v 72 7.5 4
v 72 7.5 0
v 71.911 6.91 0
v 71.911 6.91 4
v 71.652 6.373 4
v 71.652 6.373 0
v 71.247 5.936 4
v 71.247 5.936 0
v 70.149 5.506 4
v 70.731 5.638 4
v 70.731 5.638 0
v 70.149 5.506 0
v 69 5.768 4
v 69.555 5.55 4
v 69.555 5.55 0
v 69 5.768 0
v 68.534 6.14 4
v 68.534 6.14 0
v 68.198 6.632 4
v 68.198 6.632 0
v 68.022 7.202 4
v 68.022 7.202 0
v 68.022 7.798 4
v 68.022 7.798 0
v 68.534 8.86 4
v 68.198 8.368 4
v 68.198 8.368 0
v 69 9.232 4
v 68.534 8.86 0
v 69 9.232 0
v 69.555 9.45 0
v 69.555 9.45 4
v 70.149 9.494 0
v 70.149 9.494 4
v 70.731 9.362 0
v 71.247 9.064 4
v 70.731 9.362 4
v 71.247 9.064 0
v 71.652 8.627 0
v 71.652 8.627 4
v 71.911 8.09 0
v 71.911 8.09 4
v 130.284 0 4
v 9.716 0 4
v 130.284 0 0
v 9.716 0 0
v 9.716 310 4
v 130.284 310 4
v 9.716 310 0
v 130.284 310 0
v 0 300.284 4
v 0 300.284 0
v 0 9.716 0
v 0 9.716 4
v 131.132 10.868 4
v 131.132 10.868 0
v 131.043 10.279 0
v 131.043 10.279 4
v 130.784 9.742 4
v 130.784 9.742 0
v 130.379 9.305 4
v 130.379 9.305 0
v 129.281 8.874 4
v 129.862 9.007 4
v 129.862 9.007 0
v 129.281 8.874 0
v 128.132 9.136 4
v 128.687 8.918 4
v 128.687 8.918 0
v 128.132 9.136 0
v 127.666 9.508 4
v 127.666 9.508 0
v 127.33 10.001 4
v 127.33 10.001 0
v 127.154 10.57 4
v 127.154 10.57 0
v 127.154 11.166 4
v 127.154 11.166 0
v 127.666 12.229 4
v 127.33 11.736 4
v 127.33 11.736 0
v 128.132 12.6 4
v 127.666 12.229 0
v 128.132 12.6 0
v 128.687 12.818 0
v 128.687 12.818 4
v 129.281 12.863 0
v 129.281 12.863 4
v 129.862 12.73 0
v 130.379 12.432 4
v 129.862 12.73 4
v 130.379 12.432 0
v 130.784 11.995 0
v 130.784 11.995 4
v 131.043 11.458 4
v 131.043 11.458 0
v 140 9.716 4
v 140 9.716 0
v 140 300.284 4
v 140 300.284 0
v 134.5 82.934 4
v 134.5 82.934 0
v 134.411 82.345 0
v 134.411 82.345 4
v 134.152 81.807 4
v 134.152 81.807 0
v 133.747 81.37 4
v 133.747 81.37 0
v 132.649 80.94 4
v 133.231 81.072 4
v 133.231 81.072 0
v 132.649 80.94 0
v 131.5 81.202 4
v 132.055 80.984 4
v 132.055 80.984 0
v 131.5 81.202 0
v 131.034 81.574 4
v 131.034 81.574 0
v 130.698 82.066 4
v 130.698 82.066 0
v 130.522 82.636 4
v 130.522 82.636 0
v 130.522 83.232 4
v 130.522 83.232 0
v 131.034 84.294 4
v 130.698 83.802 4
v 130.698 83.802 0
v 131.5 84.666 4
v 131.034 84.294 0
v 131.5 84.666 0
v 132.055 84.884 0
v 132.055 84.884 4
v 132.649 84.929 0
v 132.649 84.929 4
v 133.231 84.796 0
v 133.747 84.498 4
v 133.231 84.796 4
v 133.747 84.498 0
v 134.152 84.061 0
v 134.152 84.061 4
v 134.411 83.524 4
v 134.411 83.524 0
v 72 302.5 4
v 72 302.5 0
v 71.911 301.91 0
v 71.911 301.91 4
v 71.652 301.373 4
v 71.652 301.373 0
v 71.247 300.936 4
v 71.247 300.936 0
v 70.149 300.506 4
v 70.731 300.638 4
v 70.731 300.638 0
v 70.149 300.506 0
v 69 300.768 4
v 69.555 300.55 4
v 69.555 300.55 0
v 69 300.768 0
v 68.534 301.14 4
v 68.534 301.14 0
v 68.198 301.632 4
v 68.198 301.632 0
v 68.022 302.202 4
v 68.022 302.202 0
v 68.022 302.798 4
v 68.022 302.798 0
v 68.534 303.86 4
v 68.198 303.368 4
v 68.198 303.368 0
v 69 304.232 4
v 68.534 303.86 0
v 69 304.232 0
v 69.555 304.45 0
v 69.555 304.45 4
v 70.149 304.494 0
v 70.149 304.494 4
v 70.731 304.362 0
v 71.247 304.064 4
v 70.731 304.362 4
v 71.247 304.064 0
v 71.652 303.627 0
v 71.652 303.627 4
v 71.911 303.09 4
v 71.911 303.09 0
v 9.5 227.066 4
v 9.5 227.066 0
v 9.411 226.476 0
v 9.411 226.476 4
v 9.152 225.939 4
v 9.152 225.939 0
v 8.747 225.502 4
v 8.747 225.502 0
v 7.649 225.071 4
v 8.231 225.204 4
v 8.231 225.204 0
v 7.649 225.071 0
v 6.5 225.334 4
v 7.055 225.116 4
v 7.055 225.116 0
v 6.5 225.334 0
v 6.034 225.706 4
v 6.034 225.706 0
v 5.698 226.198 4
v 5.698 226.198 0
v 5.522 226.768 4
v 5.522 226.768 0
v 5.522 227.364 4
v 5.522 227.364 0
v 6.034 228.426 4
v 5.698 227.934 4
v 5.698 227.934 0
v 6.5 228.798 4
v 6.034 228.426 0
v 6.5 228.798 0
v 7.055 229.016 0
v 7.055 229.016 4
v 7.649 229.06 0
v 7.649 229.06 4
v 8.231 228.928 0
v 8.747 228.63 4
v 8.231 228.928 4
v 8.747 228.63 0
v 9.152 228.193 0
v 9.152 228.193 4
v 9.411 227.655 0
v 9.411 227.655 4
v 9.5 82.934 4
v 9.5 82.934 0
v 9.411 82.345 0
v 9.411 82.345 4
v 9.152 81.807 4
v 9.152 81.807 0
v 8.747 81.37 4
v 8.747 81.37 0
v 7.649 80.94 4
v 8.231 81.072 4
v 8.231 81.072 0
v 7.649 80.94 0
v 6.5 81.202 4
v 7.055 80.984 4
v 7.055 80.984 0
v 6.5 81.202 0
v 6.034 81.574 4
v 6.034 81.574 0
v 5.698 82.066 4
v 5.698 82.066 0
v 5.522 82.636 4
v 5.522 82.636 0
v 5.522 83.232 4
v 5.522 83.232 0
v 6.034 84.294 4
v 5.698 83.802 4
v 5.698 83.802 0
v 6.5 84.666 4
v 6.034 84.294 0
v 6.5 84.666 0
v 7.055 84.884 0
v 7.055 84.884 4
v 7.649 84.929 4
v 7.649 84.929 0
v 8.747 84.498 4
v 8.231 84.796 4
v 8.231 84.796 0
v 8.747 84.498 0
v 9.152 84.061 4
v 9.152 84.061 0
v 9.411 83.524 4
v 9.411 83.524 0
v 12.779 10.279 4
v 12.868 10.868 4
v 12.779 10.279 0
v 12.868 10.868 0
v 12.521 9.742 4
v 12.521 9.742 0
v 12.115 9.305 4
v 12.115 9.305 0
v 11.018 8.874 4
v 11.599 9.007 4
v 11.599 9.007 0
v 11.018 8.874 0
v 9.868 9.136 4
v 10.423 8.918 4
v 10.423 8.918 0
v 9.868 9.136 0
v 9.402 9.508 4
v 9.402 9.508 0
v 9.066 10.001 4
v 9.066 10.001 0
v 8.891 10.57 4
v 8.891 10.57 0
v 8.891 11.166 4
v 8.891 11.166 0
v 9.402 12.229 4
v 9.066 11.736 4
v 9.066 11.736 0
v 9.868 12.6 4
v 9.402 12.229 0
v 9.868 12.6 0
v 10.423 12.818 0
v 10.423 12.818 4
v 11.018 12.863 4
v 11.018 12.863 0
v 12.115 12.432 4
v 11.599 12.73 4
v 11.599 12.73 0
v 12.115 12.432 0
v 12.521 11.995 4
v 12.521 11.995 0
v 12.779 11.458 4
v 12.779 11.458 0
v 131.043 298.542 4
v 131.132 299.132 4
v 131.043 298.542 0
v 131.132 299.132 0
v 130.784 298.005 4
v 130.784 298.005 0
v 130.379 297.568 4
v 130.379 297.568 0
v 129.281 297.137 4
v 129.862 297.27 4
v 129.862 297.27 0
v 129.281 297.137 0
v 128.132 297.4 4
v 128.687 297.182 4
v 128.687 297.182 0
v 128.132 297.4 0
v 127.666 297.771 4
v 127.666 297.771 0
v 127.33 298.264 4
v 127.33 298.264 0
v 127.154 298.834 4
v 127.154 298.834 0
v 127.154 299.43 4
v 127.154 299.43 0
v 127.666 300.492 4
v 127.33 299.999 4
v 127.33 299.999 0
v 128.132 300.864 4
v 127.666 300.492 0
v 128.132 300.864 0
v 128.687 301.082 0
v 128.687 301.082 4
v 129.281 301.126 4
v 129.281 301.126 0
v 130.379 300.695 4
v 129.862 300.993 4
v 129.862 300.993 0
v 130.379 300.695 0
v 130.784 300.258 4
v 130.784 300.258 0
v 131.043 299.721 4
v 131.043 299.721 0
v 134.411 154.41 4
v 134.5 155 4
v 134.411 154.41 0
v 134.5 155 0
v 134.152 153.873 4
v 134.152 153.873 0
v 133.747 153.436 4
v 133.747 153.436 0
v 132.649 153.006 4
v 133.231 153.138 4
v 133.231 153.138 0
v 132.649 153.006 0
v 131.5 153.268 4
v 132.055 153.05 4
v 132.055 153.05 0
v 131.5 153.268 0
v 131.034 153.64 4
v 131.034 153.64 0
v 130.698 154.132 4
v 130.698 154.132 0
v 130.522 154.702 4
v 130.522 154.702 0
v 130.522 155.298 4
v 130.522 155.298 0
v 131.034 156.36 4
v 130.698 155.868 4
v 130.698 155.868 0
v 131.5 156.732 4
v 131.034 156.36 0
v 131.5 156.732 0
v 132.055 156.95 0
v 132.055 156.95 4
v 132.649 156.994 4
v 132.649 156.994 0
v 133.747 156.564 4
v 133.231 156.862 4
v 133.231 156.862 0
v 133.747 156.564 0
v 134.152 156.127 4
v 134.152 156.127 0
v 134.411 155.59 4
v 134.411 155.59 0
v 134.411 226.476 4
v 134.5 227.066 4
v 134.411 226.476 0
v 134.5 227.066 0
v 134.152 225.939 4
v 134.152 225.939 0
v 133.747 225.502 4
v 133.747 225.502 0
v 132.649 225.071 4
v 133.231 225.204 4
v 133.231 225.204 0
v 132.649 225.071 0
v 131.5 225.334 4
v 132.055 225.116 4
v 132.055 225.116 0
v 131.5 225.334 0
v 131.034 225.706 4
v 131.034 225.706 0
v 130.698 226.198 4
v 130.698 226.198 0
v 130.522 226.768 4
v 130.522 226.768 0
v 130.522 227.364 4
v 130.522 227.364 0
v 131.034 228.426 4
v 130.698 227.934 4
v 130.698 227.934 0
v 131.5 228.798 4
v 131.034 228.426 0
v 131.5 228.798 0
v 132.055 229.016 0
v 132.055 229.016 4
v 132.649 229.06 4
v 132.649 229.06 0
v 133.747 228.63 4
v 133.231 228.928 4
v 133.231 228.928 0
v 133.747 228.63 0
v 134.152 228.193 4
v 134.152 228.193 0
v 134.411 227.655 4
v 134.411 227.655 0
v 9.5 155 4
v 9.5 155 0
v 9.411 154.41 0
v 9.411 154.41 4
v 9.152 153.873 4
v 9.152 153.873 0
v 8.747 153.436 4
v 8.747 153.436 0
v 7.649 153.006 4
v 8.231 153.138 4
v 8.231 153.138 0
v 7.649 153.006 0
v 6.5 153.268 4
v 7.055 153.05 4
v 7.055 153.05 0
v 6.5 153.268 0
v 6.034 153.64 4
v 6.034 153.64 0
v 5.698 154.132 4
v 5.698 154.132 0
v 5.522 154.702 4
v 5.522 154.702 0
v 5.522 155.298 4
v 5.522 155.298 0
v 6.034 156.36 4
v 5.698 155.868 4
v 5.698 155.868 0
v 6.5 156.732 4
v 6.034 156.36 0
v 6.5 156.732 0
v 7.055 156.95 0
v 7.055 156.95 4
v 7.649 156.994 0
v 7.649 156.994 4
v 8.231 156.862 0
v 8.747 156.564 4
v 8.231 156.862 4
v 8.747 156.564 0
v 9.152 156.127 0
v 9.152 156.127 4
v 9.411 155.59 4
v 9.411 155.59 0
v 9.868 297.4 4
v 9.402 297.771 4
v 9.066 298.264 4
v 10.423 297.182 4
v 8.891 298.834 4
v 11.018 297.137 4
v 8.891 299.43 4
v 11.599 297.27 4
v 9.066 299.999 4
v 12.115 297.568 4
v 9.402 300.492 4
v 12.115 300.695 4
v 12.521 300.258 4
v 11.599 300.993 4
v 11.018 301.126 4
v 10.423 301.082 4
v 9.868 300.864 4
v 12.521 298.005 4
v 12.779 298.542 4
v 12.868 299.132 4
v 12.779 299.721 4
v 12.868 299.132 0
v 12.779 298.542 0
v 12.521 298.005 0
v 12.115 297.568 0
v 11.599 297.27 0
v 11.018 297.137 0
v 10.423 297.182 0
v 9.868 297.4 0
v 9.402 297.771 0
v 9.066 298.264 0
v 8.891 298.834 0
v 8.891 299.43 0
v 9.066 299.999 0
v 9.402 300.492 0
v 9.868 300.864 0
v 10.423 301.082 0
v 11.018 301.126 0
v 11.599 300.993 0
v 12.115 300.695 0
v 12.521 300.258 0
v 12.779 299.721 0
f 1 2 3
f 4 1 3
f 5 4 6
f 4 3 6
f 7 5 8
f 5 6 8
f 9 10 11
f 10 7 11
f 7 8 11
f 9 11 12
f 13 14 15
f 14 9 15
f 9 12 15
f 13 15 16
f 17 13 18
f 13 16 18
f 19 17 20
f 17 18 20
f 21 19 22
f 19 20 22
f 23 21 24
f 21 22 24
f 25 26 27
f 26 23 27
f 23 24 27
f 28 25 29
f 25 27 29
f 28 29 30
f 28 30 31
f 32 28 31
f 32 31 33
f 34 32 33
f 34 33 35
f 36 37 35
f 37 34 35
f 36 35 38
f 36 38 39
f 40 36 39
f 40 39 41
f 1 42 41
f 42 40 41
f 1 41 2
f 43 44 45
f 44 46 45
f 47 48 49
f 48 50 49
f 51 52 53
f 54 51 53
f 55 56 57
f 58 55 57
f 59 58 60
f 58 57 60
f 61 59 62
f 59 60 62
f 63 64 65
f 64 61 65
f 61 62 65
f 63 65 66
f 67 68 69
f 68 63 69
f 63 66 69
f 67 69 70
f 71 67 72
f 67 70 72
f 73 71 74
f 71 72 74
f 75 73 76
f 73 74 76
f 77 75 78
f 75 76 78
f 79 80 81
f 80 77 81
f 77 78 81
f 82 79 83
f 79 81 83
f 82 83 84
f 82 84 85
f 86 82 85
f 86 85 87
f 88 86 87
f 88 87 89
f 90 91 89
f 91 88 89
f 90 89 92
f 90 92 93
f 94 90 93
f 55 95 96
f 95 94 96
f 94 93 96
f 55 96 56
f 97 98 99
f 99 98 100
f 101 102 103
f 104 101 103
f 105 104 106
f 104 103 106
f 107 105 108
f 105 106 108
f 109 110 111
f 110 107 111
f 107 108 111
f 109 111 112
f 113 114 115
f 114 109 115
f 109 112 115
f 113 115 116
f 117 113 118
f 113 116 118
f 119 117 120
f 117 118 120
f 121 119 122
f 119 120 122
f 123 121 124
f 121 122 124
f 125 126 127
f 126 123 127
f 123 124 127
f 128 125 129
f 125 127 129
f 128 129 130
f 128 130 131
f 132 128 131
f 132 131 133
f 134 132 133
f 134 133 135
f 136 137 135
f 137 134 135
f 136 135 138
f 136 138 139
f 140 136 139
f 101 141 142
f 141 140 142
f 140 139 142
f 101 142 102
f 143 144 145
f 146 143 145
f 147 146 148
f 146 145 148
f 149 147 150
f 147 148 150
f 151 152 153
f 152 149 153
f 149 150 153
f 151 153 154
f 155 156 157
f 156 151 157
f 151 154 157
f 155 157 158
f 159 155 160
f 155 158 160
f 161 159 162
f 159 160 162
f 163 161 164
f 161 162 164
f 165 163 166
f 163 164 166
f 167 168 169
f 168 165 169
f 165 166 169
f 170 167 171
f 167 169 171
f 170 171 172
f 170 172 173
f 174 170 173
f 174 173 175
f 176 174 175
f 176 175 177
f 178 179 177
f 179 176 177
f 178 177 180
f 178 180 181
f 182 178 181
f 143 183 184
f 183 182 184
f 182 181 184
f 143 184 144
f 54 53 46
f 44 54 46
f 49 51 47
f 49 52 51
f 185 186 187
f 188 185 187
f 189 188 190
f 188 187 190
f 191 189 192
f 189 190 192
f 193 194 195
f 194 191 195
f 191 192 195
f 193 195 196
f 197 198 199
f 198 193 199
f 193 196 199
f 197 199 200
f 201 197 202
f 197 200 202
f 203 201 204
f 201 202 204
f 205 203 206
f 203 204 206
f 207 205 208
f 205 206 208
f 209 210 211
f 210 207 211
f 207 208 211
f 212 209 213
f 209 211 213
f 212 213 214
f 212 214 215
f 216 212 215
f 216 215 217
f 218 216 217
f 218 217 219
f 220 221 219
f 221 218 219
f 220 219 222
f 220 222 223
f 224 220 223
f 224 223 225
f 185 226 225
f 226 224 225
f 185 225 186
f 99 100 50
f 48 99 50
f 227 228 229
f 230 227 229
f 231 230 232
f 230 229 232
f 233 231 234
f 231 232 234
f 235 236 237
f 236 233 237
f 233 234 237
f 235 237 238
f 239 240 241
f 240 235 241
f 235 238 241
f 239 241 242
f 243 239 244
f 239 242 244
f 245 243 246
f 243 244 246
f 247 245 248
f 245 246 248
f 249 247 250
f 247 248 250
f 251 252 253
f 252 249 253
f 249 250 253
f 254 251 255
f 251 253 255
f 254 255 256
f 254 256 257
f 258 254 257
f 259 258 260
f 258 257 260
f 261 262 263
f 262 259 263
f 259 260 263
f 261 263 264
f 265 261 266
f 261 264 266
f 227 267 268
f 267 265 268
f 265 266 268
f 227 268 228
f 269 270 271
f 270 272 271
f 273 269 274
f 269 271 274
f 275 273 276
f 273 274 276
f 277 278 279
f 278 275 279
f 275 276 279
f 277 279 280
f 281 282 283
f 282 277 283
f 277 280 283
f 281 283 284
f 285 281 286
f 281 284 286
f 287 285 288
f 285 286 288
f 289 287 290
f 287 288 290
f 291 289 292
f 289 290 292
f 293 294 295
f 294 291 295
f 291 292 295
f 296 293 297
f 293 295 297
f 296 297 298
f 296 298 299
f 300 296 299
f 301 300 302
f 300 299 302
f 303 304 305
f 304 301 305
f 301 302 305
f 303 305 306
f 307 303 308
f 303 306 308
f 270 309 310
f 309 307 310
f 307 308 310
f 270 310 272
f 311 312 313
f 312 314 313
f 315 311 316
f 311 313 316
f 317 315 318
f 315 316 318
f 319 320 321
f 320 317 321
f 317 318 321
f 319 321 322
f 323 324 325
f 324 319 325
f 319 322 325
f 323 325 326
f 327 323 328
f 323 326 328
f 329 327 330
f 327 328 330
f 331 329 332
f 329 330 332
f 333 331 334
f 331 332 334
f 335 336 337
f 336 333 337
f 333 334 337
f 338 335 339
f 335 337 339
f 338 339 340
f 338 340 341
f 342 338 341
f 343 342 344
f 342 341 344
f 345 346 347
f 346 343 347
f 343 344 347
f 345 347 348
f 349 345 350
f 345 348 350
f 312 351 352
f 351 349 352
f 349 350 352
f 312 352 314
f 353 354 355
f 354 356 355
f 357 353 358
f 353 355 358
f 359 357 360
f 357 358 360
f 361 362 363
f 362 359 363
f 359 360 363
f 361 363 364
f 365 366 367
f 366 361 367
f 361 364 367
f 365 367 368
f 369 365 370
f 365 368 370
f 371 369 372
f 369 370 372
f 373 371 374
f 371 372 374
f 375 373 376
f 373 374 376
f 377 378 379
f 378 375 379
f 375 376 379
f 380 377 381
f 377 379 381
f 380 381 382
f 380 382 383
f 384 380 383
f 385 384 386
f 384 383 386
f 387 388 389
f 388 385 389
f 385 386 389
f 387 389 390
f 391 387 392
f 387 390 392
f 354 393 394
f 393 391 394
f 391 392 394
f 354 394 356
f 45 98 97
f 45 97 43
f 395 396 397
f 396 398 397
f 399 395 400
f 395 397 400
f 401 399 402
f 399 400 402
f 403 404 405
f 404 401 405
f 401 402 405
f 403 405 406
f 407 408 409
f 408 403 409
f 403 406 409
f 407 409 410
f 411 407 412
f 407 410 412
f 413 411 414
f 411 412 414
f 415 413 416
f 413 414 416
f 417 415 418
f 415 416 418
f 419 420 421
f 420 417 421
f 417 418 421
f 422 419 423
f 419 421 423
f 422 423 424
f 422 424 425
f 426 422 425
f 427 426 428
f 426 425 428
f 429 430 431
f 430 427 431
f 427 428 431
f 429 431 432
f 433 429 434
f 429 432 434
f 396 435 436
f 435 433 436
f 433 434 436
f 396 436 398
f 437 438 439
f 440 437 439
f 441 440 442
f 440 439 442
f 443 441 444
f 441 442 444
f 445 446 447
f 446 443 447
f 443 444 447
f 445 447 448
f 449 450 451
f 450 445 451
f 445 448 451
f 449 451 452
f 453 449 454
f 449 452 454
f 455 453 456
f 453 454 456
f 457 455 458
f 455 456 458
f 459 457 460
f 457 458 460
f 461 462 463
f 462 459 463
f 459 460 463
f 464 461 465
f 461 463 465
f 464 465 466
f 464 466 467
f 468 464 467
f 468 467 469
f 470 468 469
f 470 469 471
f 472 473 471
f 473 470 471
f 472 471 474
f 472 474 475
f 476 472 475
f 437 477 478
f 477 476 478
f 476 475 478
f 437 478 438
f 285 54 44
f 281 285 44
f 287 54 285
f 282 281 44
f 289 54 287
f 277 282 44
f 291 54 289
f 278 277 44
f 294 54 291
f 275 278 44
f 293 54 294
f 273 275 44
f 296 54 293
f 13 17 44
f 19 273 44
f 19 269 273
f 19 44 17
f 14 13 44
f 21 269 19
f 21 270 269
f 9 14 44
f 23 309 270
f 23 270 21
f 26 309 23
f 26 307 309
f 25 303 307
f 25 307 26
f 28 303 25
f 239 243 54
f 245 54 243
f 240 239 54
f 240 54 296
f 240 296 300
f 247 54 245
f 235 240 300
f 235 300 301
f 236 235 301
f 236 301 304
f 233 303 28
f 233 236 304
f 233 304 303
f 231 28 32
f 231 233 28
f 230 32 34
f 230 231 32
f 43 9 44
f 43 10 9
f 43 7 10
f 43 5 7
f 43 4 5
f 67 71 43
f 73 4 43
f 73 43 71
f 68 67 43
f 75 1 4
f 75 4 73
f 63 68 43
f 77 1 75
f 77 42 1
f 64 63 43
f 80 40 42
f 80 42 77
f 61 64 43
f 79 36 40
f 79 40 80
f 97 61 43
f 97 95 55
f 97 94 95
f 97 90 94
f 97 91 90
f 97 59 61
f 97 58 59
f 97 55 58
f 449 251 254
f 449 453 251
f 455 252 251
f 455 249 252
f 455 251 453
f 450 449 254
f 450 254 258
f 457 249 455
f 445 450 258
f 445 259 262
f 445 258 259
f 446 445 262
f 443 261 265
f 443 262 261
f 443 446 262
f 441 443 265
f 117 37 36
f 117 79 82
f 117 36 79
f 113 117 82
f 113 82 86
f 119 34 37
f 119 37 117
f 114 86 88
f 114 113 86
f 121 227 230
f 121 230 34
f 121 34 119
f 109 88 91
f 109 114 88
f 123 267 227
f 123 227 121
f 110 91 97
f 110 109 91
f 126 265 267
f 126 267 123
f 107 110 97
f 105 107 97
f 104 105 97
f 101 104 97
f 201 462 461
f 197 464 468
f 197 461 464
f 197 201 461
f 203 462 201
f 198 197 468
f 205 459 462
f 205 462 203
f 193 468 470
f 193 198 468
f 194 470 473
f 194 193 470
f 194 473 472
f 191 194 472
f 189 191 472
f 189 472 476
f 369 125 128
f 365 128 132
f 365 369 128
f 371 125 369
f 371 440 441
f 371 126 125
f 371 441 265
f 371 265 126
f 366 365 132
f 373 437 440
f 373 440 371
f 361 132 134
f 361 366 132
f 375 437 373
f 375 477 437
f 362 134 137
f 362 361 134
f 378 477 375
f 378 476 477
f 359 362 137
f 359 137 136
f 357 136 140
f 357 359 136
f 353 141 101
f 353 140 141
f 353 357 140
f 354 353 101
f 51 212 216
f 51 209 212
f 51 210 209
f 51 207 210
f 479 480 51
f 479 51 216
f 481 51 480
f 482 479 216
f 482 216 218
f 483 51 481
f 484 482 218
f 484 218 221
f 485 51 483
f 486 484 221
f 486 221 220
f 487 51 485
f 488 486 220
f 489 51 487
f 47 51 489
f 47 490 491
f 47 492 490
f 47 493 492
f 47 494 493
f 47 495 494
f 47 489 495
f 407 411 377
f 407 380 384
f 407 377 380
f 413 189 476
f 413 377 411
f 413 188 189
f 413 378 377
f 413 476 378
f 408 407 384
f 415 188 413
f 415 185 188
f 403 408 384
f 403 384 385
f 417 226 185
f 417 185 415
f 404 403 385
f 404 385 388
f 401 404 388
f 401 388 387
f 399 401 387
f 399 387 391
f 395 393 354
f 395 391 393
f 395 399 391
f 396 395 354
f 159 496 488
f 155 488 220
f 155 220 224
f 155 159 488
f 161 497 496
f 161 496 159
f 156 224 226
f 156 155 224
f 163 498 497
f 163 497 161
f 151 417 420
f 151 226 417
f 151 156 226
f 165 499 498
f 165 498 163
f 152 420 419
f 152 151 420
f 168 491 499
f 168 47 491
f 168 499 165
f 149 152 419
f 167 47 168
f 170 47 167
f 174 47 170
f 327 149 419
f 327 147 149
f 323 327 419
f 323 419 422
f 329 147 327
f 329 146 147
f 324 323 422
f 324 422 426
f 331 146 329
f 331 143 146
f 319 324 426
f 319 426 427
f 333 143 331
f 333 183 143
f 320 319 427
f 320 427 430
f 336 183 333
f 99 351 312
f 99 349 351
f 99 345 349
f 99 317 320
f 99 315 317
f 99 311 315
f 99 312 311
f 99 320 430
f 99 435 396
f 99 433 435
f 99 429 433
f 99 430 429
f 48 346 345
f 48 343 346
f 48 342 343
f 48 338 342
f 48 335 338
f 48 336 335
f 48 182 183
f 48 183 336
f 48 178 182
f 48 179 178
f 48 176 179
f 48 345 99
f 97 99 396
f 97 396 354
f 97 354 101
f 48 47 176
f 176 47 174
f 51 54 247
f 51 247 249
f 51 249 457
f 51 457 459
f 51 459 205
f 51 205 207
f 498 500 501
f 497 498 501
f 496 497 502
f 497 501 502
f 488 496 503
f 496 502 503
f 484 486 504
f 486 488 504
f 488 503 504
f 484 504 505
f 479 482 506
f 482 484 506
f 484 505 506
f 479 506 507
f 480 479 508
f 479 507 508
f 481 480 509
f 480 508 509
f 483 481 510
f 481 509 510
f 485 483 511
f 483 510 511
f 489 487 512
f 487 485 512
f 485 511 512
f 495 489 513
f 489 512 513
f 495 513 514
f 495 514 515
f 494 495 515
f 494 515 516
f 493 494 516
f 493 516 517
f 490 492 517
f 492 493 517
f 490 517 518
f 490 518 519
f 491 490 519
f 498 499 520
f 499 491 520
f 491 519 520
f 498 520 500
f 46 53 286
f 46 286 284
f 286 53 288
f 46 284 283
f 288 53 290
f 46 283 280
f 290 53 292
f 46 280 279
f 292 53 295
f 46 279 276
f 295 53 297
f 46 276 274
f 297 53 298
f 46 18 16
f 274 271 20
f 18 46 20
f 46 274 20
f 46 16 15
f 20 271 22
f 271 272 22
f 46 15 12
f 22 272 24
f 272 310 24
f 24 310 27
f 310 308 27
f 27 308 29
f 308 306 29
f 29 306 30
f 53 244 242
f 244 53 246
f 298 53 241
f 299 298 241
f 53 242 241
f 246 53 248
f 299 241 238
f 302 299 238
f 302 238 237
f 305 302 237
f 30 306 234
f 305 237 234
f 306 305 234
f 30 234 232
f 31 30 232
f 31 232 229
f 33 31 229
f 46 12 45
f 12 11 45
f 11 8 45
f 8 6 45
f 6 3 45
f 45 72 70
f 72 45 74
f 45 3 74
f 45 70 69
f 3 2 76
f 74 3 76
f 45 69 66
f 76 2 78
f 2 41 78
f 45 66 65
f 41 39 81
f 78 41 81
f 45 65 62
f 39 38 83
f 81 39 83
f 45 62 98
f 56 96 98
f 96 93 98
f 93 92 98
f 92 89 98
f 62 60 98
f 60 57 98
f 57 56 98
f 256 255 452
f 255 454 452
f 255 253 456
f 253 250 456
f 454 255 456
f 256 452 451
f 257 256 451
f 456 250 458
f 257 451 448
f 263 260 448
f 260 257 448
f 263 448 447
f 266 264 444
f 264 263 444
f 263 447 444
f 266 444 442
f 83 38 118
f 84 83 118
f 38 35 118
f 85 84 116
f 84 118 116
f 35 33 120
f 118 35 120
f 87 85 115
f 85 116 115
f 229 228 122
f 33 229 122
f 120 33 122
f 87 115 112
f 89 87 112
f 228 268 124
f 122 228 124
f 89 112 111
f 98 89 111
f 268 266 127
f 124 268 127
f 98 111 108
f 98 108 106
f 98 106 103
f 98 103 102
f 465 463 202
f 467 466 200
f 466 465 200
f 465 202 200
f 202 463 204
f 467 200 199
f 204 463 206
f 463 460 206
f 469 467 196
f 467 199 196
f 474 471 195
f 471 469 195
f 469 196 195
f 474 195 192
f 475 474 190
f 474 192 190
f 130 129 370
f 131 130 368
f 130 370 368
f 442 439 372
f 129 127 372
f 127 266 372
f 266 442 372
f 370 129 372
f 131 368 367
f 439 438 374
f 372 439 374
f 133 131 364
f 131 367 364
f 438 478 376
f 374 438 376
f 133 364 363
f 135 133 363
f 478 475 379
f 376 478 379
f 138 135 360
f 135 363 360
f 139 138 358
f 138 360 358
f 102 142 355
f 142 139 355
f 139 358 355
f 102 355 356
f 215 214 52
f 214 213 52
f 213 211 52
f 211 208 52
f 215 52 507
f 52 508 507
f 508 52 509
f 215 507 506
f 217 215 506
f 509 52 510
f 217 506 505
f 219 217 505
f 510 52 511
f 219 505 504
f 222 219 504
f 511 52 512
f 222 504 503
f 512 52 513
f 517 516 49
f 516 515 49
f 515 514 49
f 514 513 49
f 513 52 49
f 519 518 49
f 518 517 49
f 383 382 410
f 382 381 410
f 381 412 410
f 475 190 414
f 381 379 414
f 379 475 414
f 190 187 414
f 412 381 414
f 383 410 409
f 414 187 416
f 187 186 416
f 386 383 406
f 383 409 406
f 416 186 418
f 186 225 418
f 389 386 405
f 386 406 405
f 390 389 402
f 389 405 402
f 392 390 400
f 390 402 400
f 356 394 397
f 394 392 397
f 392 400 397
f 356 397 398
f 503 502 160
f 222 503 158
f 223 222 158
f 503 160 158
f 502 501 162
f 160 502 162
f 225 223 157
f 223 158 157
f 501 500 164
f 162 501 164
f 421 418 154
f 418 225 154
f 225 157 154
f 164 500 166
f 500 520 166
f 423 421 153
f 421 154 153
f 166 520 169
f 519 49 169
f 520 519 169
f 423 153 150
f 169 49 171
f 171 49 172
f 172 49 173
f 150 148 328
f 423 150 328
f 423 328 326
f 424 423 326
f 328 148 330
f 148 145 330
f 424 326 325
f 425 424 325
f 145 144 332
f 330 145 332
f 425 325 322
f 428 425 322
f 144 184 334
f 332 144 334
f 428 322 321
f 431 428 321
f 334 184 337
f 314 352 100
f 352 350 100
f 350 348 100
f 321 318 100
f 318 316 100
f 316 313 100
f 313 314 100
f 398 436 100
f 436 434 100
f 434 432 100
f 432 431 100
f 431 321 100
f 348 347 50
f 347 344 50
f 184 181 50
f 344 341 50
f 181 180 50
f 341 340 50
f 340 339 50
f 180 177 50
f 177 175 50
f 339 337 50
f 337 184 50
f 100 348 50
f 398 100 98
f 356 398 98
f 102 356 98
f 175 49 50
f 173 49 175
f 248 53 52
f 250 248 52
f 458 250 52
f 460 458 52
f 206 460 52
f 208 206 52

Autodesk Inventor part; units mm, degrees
ref_plane "YZ Plane" through (0, 0, 0) normal (1, 0, 0) x (0, 1, 0)
ref_plane "XZ Plane" through (0, 0, 0) normal (0, 1, 0) x (-1, 0, 0)
ref_plane "XY Plane" through (0, 0, 0) normal (0, 0, 1) x (1, 0, 0)
sketch "Sketch1" plane through (0, 0, 0) normal (0, 0, 1) x (1, 0, 0)
  line L0 (0, 0) -> (140, 0)
  line L1 (140, 0) -> (140, 310)
  line L2 (140, 310) -> (0, 310)
  line L3 (0, 310) -> (0, 0)
  line L4 (15, 295) -> (125, 295) construction
  line L5 (125, 295) -> (125, 15) construction
  line L6 (125, 15) -> (15, 15) construction
  line L7 (15, 15) -> (15, 295) construction
  line L8 (15, 295) -> (125, 295) construction
  line L9 (70, 314.0975) -> (70, 322.6254) construction
  line L10 (15, 295) -> (15, 269.8596) construction
  line L11 (125, 295) -> (125, 292.6022) construction
  line L12 (0, 165.5) -> (-18, 165.5)
  line L13 (-18, 165.5) -> (-18, 185.5)
  line L14 (-18, 185.5) -> (0, 185.5) construction
  line L15 (0, 185.5) -> (0, 165.5)
  line L16 (-24.3067, 155) -> (-34.4998, 155) construction
  circle A0 centre (-9, 175.5) radius 3
  line L17 (-18, 185.5) -> (0, 205.5)
  line L18 (0, 144.5) -> (-18, 144.5)
  line L19 (-18, 144.5) -> (-18, 124.5)
  circle A1 centre (-9, 134.5) radius 3
  line L20 (-18, 124.5) -> (0, 104.5)
  line L21 (140, 165.5) -> (158, 165.5)
  line L22 (158, 165.5) -> (158, 185.5)
  circle A2 centre (149, 175.5) radius 3
  line L23 (158, 185.5) -> (140, 205.5)
  line L24 (158, 144.5) -> (158, 124.5)
  line L25 (140, 144.5) -> (158, 144.5)
  circle A3 centre (149, 134.5) radius 3
  line L26 (158, 124.5) -> (140, 104.5)
  line L27 (0, 300.2843) -> (9.7157, 310)
  line L28 (140, 300.2843) -> (130.2843, 310)
  line L29 (0, 9.7157) -> (9.7157, 0)
  line L30 (140, 9.7157) -> (130.2843, 0)
  line L31 (70, 295) -> (70, 310) construction
  line L32 (0, 155) -> (15, 155) construction
  line L33 (23.9173, 286.0827) -> (15, 295) construction
  line L34 (16.5096, 292.7523) -> (17.2477, 293.4904)
  line L35 (23.9173, 286.0827) -> (16.8787, 293.1213) construction
  line L36 (123.4904, 292.7523) -> (122.7523, 293.4904)
  line L37 (15, 17.2679) -> (15, 136.2679) construction
  line L38 (17, 136.2679) -> (17, 17.2679)
  arc A4 (17, 136.2679) -> (15, 136.2679) centre (16, 136.2679) ccw construction
  arc A5 (14, 16.2679) -> (15, 17.2679) centre (14, 17.2679) ccw construction
  line L39 (14, 16.2679) -> (12, 16.2679) construction
  arc A6 (17, 17.2679) -> (18, 16.2679) centre (18, 17.2679) ccw
  line L40 (20, 16.2679) -> (18, 16.2679)
  line L41 (21, 17.2679) -> (21, 136.2679)
  line L42 (23, 136.2679) -> (23, 17.2679)
  arc A7 (23, 17.2679) -> (24, 16.2679) centre (24, 17.2679) ccw
  arc A8 (23, 136.2679) -> (21, 136.2679) centre (22, 136.2679) ccw
  arc A9 (20, 16.2679) -> (21, 17.2679) centre (20, 17.2679) ccw
  line L43 (26, 16.2679) -> (24, 16.2679)
  line L44 (27, 17.2679) -> (27, 136.2679)
  line L45 (29, 136.2679) -> (29, 17.2679)
  arc A10 (29, 17.2679) -> (30, 16.2679) centre (30, 17.2679) ccw
  arc A11 (29, 136.2679) -> (27, 136.2679) centre (28, 136.2679) ccw
  arc A12 (26, 16.2679) -> (27, 17.2679) centre (26, 17.2679) ccw
  line L46 (32, 16.2679) -> (30, 16.2679)
  line L47 (33, 17.2679) -> (33, 136.2679)
  line L48 (35, 136.2679) -> (35, 17.2679)
  arc A13 (35, 17.2679) -> (36, 16.2679) centre (36, 17.2679) ccw
  arc A14 (35, 136.2679) -> (33, 136.2679) centre (34, 136.2679) ccw
  arc A15 (32, 16.2679) -> (33, 17.2679) centre (32, 17.2679) ccw
  line L49 (38, 16.2679) -> (36, 16.2679)
  line L50 (39, 17.2679) -> (39, 136.2679)
  line L51 (41, 136.2679) -> (41, 17.2679)
  arc A16 (41, 17.2679) -> (42, 16.2679) centre (42, 17.2679) ccw
  arc A17 (41, 136.2679) -> (39, 136.2679) centre (40, 136.2679) ccw
  arc A18 (38, 16.2679) -> (39, 17.2679) centre (38, 17.2679) ccw
  line L52 (44, 16.2679) -> (42, 16.2679)
  line L53 (45, 17.2679) -> (45, 136.2679)
  line L54 (47, 136.2679) -> (47, 17.2679)
  arc A19 (47, 17.2679) -> (48, 16.2679) centre (48, 17.2679) ccw
  arc A20 (47, 136.2679) -> (45, 136.2679) centre (46, 136.2679) ccw
  arc A21 (44, 16.2679) -> (45, 17.2679) centre (44, 17.2679) ccw
  line L55 (50, 16.2679) -> (48, 16.2679)
  line L56 (51, 17.2679) -> (51, 136.2679)
  line L57 (53, 136.2679) -> (53, 17.2679)
  arc A22 (53, 17.2679) -> (54, 16.2679) centre (54, 17.2679) ccw
  arc A23 (53, 136.2679) -> (51, 136.2679) centre (52, 136.2679) ccw
  arc A24 (50, 16.2679) -> (51, 17.2679) centre (50, 17.2679) ccw
  line L58 (56, 16.2679) -> (54, 16.2679)
  line L59 (57, 17.2679) -> (57, 136.2679)
  line L60 (59, 136.2679) -> (59, 17.2679)
  arc A25 (59, 17.2679) -> (60, 16.2679) centre (60, 17.2679) ccw
  arc A26 (59, 136.2679) -> (57, 136.2679) centre (58, 136.2679) ccw
  arc A27 (56, 16.2679) -> (57, 17.2679) centre (56, 17.2679) ccw
  line L61 (62, 16.2679) -> (60, 16.2679)
  line L62 (63, 17.2679) -> (63, 136.2679)
  line L63 (65, 136.2679) -> (65, 17.2679)
  arc A28 (65, 17.2679) -> (66, 16.2679) centre (66, 17.2679) ccw
  arc A29 (65, 136.2679) -> (63, 136.2679) centre (64, 136.2679) ccw
  arc A30 (62, 16.2679) -> (63, 17.2679) centre (62, 17.2679) ccw
  line L64 (68, 16.2679) -> (66, 16.2679)
  line L65 (69, 17.2679) -> (69, 136.2679)
  line L66 (71, 136.2679) -> (71, 17.2679)
  arc A31 (71, 17.2679) -> (72, 16.2679) centre (72, 17.2679) ccw
  arc A32 (71, 136.2679) -> (69, 136.2679) centre (70, 136.2679) ccw
  arc A33 (68, 16.2679) -> (69, 17.2679) centre (68, 17.2679) ccw
  line L67 (74, 16.2679) -> (72, 16.2679)
  line L68 (75, 17.2679) -> (75, 136.2679)
  line L69 (77, 136.2679) -> (77, 17.2679)
  arc A34 (77, 17.2679) -> (78, 16.2679) centre (78, 17.2679) ccw
  arc A35 (77, 136.2679) -> (75, 136.2679) centre (76, 136.2679) ccw
  arc A36 (74, 16.2679) -> (75, 17.2679) centre (74, 17.2679) ccw
  line L70 (80, 16.2679) -> (78, 16.2679)
  line L71 (81, 17.2679) -> (81, 136.2679)
  line L72 (83, 136.2679) -> (83, 17.2679)
  arc A37 (83, 17.2679) -> (84, 16.2679) centre (84, 17.2679) ccw
  arc A38 (83, 136.2679) -> (81, 136.2679) centre (82, 136.2679) ccw
  arc A39 (80, 16.2679) -> (81, 17.2679) centre (80, 17.2679) ccw
  line L73 (86, 16.2679) -> (84, 16.2679)
  line L74 (87, 17.2679) -> (87, 136.2679)
  line L75 (89, 136.2679) -> (89, 17.2679)
  arc A40 (89, 17.2679) -> (90, 16.2679) centre (90, 17.2679) ccw
  arc A41 (89, 136.2679) -> (87, 136.2679) centre (88, 136.2679) ccw
  arc A42 (86, 16.2679) -> (87, 17.2679) centre (86, 17.2679) ccw
  line L76 (92, 16.2679) -> (90, 16.2679)
  line L77 (93, 17.2679) -> (93, 136.2679)
  line L78 (95, 136.2679) -> (95, 17.2679)
  arc A43 (95, 17.2679) -> (96, 16.2679) centre (96, 17.2679) ccw
  arc A44 (95, 136.2679) -> (93, 136.2679) centre (94, 136.2679) ccw
  arc A45 (92, 16.2679) -> (93, 17.2679) centre (92, 17.2679) ccw
  line L79 (98, 16.2679) -> (96, 16.2679)
  line L80 (99, 17.2679) -> (99, 136.2679)
  line L81 (101, 136.2679) -> (101, 17.2679)
  arc A46 (101, 17.2679) -> (102, 16.2679) centre (102, 17.2679) ccw
  arc A47 (101, 136.2679) -> (99, 136.2679) centre (100, 136.2679) ccw
  arc A48 (98, 16.2679) -> (99, 17.2679) centre (98, 17.2679) ccw
  line L82 (104, 16.2679) -> (102, 16.2679)
  line L83 (105, 17.2679) -> (105, 136.2679)
  line L84 (107, 136.2679) -> (107, 17.2679)
  arc A49 (107, 17.2679) -> (108, 16.2679) centre (108, 17.2679) ccw
  arc A50 (107, 136.2679) -> (105, 136.2679) centre (106, 136.2679) ccw
  arc A51 (104, 16.2679) -> (105, 17.2679) centre (104, 17.2679) ccw
  line L85 (110, 16.2679) -> (108, 16.2679)
  line L86 (111, 17.2679) -> (111, 136.2679)
  line L87 (113, 136.2679) -> (113, 17.2679)
  arc A52 (113, 17.2679) -> (114, 16.2679) centre (114, 17.2679) ccw
  arc A53 (113, 136.2679) -> (111, 136.2679) centre (112, 136.2679) ccw
  arc A54 (110, 16.2679) -> (111, 17.2679) centre (110, 17.2679) ccw
  line L88 (116, 16.2679) -> (114, 16.2679)
  line L89 (117, 17.2679) -> (117, 136.2679)
  line L90 (119, 136.2679) -> (119, 17.2679)
  arc A55 (119, 17.2679) -> (120, 16.2679) centre (120, 17.2679) ccw
  arc A56 (119, 136.2679) -> (117, 136.2679) centre (118, 136.2679) ccw
  arc A57 (116, 16.2679) -> (117, 17.2679) centre (116, 17.2679) ccw
  line L91 (122, 16.2679) -> (120, 16.2679)
  line L92 (123, 17.2679) -> (123, 136.2679)
  line L93 (125, 136.2679) -> (125, 17.2679) construction
  arc A58 (125, 17.2679) -> (126, 16.2679) centre (126, 17.2679) ccw construction
  arc A59 (125, 136.2679) -> (123, 136.2679) centre (124, 136.2679) ccw construction
  arc A60 (122, 16.2679) -> (123, 17.2679) centre (122, 17.2679) ccw
  spline S0 degree 4 poles (16.5096, 292.7523) (14.6703, 290.9129) (15.6874, 287.8803) (14.9514, 263.0684) (27.2259, 252.1032) (45.0884, 239.248) (54.8331, 236.5084) (66.6786, 222.7415) (65.5, 220.3383) (65.5, 218.384) knots 0 0 0 0 0 0.198302 0.355061 0.529019 0.693641 0.832065 1 1 1 1 1
  line L94 (65.5, 218.384) -> (65.5, 202.0117) construction
  line L95 (74.5, 218.384) -> (74.5, 202.0117) construction
  spline S1 degree 4 poles (123.4904, 292.7523) (125.3297, 290.9129) (124.3126, 287.8803) (125.0486, 263.0684) (112.7741, 252.1032) (94.9116, 239.248) (85.1669, 236.5084) (73.3214, 222.7415) (74.5, 220.3383) (74.5, 218.384) knots 0 0 0 0 0 0.198302 0.355061 0.529019 0.693641 0.832065 1 1 1 1 1
  line L96 (65.5, 218.384) -> (74.5, 218.384) construction
  line L97 (65.5389, 141.7679) -> (74.4611, 141.7679) construction
  line L98 (70, 141.7679) -> (70, 218.384) construction
  line L99 (70, 218.384) -> (70, 295) construction
  line L100 (65.5, 218.384) -> (15, 218.384) construction
  line L101 (62.8466, 226.2847) -> (62.8466, 218.384) construction
  line L102 (57.0465, 232.5428) -> (57.0465, 218.384) construction
  line L103 (45.5, 240.1042) -> (45.5, 218.384) construction
  line L104 (28.8522, 251.4195) -> (28.8522, 218.384) construction
  line L105 (17.5, 267.9145) -> (17.5, 218.384) construction
  line L106 (15.2393, 288.9289) -> (15.2393, 218.384) construction
  spline S2 degree 4 poles (65.5, 218.384) (65.5, 215.0113) (62.762, 209.2142) (57.6098, 203.6988) (43.4805, 195.4527) (24.4915, 184.5352) (15.1033, 169.2275) (15, 156.1972) (15, 148.5289) knots 0 0 0 0 0 0.197939 0.350153 0.51962 0.706517 1 1 1 1 1
  line L107 (62.8466, 218.384) -> (62.8466, 210.4833) construction
  line L108 (57.0465, 218.384) -> (57.0465, 204.2251) construction
  line L109 (45.5, 218.384) -> (45.5, 196.6637) construction
  line L110 (28.8522, 218.384) -> (28.8522, 185.3485) construction
  line L111 (17.5, 218.384) -> (17.5, 168.8535) construction
  spline S3 degree 4 poles (74.5, 218.384) (74.5, 215.0113) (77.238, 209.2142) (82.3902, 203.6988) (96.5195, 195.4527) (115.5085, 184.5352) (124.8967, 169.2275) (125, 156.1972) (125, 148.5289) knots 0 0 0 0 0 0.197939 0.350153 0.51962 0.706517 1 1 1 1 1
  line L112 (125, 148.5289) -> (125, 140.8711) construction
  circle A61 centre (70, 198.7679) radius 1
  circle A62 centre (70, 184.7679) radius 1
  circle A63 centre (70, 170.7679) radius 1
  circle A64 centre (70, 156.7679) radius 1
  circle A65 centre (70, 142.7679) radius 1
  line L113 (-110.1015, 148.4668) -> (-137.337, 121.2312) construction
  line L114 (-137.337, 121.2312) -> (-99.9418, 121.2312) construction
  circle A66 centre (63, 191.7679) radius 1
  line L115 (209.7417, 198.7679) -> (209.7417, 184.7679) construction
  line L116 (63, 191.7679) -> (70, 198.7679) construction
  circle A67 centre (63, 177.7679) radius 1
  circle A68 centre (63, 163.7679) radius 1
  circle A69 centre (63, 149.7679) radius 1
  line L117 (70, 184.7679) -> (70, 170.7679) construction
  line L118 (70, 170.7679) -> (70, 156.7679) construction
  line L119 (70, 156.7679) -> (70, 142.7679) construction
  line L120 (63, 191.7679) -> (56, 184.7679) construction
  line L121 (56, 184.7679) -> (49, 177.7679) construction
  line L122 (49, 177.7679) -> (42, 170.7679) construction
  line L123 (42, 170.7679) -> (35, 163.7679) construction
  line L124 (35, 163.7679) -> (28, 156.7679) construction
  line L125 (28, 156.7679) -> (21, 149.7679) construction
  line L126 (21, 149.7679) -> (14, 142.7679) construction
  line L127 (14, 156.7679) -> (21, 163.7679) construction
  line L128 (21, 163.7679) -> (28, 170.7679) construction
  line L129 (28, 170.7679) -> (35.279, 178.047) construction
  line L130 (35.279, 178.047) -> (42, 184.7679) construction
  circle A70 centre (56, 184.7679) radius 1
  circle A71 centre (49, 177.7679) radius 1
  circle A72 centre (42, 184.7679) radius 1
  circle A73 centre (42, 170.7679) radius 1
  circle A74 centre (35, 177.7679) radius 1
  circle A75 centre (28, 170.7679) radius 1
  circle A76 centre (35, 163.7679) radius 1
  circle A77 centre (49, 163.7679) radius 1
  circle A78 centre (56, 170.7679) radius 1
  circle A79 centre (21, 163.7679) radius 1
  circle A80 centre (21, 149.7679) radius 1
  circle A81 centre (49, 191.7679) radius 1
  circle A82 centre (42, 156.7679) radius 1
  circle A83 centre (28, 156.7679) radius 1
  circle A84 centre (28, 142.7679) radius 1
  circle A85 centre (35, 149.7679) radius 1
  circle A86 centre (42, 142.7679) radius 1
  circle A87 centre (49, 149.7679) radius 1
  circle A88 centre (56, 156.7679) radius 1
  circle A89 centre (56, 142.7679) radius 1
  circle A90 centre (77, 191.7679) radius 1
  circle A91 centre (77, 177.7679) radius 1
  circle A92 centre (77, 163.7679) radius 1
  circle A93 centre (77, 149.7679) radius 1
  circle A94 centre (84, 184.7679) radius 1
  circle A95 centre (91, 177.7679) radius 1
  circle A96 centre (98, 184.7679) radius 1
  circle A97 centre (98, 170.7679) radius 1
  circle A98 centre (105, 177.7679) radius 1
  circle A99 centre (112, 170.7679) radius 1
  circle A100 centre (105, 163.7679) radius 1
  circle A101 centre (91, 163.7679) radius 1
  circle A102 centre (84, 170.7679) radius 1
  circle A103 centre (119, 163.7679) radius 1
  circle A104 centre (119, 149.7679) radius 1
  circle A105 centre (91, 191.7679) radius 1
  circle A106 centre (98, 156.7679) radius 1
  circle A107 centre (112, 156.7679) radius 1
  circle A108 centre (112, 142.7679) radius 1
  circle A109 centre (105, 149.7679) radius 1
  circle A110 centre (98, 142.7679) radius 1
  circle A111 centre (91, 149.7679) radius 1
  circle A112 centre (84, 156.7679) radius 1
  circle A113 centre (84, 142.7679) radius 1
  line L131 (15, 148.5289) -> (15, 140.2675)
  line L132 (125, 148.5289) -> (125, 140.2675)
  spline S4 degree 4 poles (17.2477, 293.4904) (18.1955, 294.4381) (19.6714, 295.0826) (20.7017, 295) (21.8623, 295) knots 0 0 0 0 0 1 1 1 1 1
  spline S5 degree 3 poles (122.7523, 293.4904) (121.4886, 294.7541) (119.4432, 295.1927) (118.1377, 295) knots 0 0 0 0 1 1 1 1
  line L133 (118.1377, 295) -> (21.8623, 295)
  line L134 (16.8787, 293.1213) -> (23.2316, 286.7684) construction
  arc A114 (19, 310) -> (0, 291) centre (19, 291) ccw construction
  arc A115 (19, 295) -> (15, 291) centre (19, 291) ccw construction
  line L135 (19, 291) -> (10, 291) construction
  line L136 (19, 291) -> (19, 300) construction
  line L137 (16.1716, 293.8284) -> (5.565, 304.435) construction
  circle A116 centre (10.8683, 299.1317) radius 2
  line L138 (9.8231, 300.915) -> (9.085, 300.1769) construction
  line L139 (11.9134, 297.3485) -> (12.6515, 298.0866) construction
  circle A117 centre (70, 302.5) radius 2
  circle A118 centre (7.5, 155) radius 2
  circle A119 centre (7.5, 227.0659) radius 2
  line L140 (7.5, 155) -> (7.5, 227.0659) construction
  line L141 (7.5, 227.0659) -> (7.5, 299.1317) construction
  arc A120 (140, 291) -> (121, 310) centre (121, 291) ccw construction
  arc A121 (125, 291) -> (121, 295) centre (121, 291) ccw construction
  circle A122 centre (129.1317, 299.1317) radius 2
  circle A123 centre (132.5, 155) radius 2
  circle A124 centre (132.5, 227.0659) radius 2
  circle A125 centre (10.8683, 10.8683) radius 2
  circle A126 centre (70, 7.5) radius 2
  circle A127 centre (7.5, 82.9341) radius 2
  circle A128 centre (132.5, 82.9341) radius 2
  circle A129 centre (129.1317, 10.8683) radius 2
  arc A130 (0, 19) -> (19, 0) centre (19, 19) ccw construction
  arc A131 (15, 19) -> (19, 15) centre (19, 19) ccw construction
  arc A132 (121, 0) -> (140, 19) centre (121, 19) ccw construction
  arc A133 (121, 15) -> (125, 19) centre (121, 19) ccw construction
  circle A134 centre (10.8683, 299.1317) radius 7.5 construction
  line L142 (4.4716, 303.3416) -> (6.8718, 305.7419) construction
  line L143 (15, 140.2675) -> (15, 136.2679) construction
  line L144 (123.2929, 136.9751) -> (125, 138.6822)
  arc A135 (123.2929, 136.9751) -> (123, 136.2679) centre (124, 136.2679) ccw
  line L145 (125, 138.6822) -> (125, 140.2675)
  line L146 (15, 138.6822) -> (16.7071, 136.9751)
  arc A136 (17, 136.2679) -> (16.7071, 136.9751) centre (16, 136.2679) ccw
  line L147 (15, 138.6822) -> (15, 140.2675)
  point P0 (70, 318.3615)
  point P1 (-29.4032, 155)
  point P2 (-18, 175.5)
  point P3 (-9, 185.5)
  point P4 (65.2876, 221.8871)
  point P5 (122.5, 267.9145)
  point P6 (111.1478, 251.4195)
  point P7 (94.5, 240.1042)
  point P8 (82.9535, 232.5428)
  point P9 (74.7124, 221.8871)
  point P10 (124.7607, 288.9289)
  point P11 (77.1534, 210.4833)
  point P12 (82.9535, 204.2251)
  point P13 (94.5, 196.6637)
  point P14 (111.1478, 185.3485)
  point P15 (122.5, 168.8535)
  point P16 (209.7417, 191.7679)
  point P17 (70, 177.7679)
  point P18 (70, 163.7679)
  point P19 (70, 149.7679)
  point P20 (19.6961, 294.835)
  point P21 (120.3039, 294.835)
  point P22 (9.4541, 300.5459)
  point P23 (12.2825, 297.7175)
  dimension "d163" = 4
  dimension "d0" = 140
  dimension "d1" = 310
  dimension "d2" = 15
  dimension "d85" = 18
  dimension "d86" = 20
  dimension "d87" = 10.5
  dimension "d88" = 6
  dimension "d89" = 20
  dimension "d114" = 135
  dimension "d124" = 2
  dimension "d126" = 1
  dimension "d128" = 2
  dimension "d136" = 6
  dimension "d141" = 9
  dimension "d142" = 5.5
  dimension "pegd" = 2
  dimension "d147" = 14
  dimension "d152" = 45
  dimension "d158" = 45
  dimension "d161" = 4
  dimension "d164" = 5.5
  dimension "d168" = 15
  dimension "d169" = 1
  dimension "d170" = 1
  dimension "d171" = 1
  dimension "d172" = 120
  dimension "d178" = 45
  dimension "d179" = 45
extrude "Extrusion6" add sketch "Sketch1" along normal blind 4 contours L29 L3 L27 L2 L28 L1 L30 L0 | L34 S4 L133 S5 L36 S1 S3 L132 L145 L144 A135 L92 A60 L91 A55 L90 A56 L89 A57 L88 A52 L87 A53 L86 A54 L85 A49 L84 A50 L83 A51 L82 A46 L81 A47 L80 A48 L79 A43 L78 A44 L77 A45 L76 A40 L75 A41 L74 A42 L73 A37 L72 A38 L71 A39 L70 A34 L69 A35 L68 A36 L67 A31 L66 A32 L65 A33 L64 A28 L63 A29 L62 A30 L61 A25 L60 A26 L59 A27 L58 A22 L57 A23 L56 A24 L55 A19 L54 A20 L53 A21 L52 A16 L51 A17 L50 A18 L49 A13 L48 A14 L47 A15 L46 A10 L45 A11 L44 A12 L43 A7 L42 A8 L41 A9 L40 A6 L38 A136 L146 L147 L131 S2 S0 | A61 | A62 | A63 | A64 | A65 | A66 | A67 | A68 | A69 | A70 | A71 | A72 | A73 | A74 | A75 | A76 | A77 | A78 | A79 | A80 | A81 | A82 | A83 | A84 | A85 | A86 | A87 | A88 | A89 | A90 | A91 | A92 | A93 | A94 | A95 | A96 | A97 | A98 | A99 | A100 | A101 | A102 | A103 | A104 | A105 | A106 | A107 | A108 | A109 | A110 | A111 | A112 | A113
properties part number "GB-glass"
